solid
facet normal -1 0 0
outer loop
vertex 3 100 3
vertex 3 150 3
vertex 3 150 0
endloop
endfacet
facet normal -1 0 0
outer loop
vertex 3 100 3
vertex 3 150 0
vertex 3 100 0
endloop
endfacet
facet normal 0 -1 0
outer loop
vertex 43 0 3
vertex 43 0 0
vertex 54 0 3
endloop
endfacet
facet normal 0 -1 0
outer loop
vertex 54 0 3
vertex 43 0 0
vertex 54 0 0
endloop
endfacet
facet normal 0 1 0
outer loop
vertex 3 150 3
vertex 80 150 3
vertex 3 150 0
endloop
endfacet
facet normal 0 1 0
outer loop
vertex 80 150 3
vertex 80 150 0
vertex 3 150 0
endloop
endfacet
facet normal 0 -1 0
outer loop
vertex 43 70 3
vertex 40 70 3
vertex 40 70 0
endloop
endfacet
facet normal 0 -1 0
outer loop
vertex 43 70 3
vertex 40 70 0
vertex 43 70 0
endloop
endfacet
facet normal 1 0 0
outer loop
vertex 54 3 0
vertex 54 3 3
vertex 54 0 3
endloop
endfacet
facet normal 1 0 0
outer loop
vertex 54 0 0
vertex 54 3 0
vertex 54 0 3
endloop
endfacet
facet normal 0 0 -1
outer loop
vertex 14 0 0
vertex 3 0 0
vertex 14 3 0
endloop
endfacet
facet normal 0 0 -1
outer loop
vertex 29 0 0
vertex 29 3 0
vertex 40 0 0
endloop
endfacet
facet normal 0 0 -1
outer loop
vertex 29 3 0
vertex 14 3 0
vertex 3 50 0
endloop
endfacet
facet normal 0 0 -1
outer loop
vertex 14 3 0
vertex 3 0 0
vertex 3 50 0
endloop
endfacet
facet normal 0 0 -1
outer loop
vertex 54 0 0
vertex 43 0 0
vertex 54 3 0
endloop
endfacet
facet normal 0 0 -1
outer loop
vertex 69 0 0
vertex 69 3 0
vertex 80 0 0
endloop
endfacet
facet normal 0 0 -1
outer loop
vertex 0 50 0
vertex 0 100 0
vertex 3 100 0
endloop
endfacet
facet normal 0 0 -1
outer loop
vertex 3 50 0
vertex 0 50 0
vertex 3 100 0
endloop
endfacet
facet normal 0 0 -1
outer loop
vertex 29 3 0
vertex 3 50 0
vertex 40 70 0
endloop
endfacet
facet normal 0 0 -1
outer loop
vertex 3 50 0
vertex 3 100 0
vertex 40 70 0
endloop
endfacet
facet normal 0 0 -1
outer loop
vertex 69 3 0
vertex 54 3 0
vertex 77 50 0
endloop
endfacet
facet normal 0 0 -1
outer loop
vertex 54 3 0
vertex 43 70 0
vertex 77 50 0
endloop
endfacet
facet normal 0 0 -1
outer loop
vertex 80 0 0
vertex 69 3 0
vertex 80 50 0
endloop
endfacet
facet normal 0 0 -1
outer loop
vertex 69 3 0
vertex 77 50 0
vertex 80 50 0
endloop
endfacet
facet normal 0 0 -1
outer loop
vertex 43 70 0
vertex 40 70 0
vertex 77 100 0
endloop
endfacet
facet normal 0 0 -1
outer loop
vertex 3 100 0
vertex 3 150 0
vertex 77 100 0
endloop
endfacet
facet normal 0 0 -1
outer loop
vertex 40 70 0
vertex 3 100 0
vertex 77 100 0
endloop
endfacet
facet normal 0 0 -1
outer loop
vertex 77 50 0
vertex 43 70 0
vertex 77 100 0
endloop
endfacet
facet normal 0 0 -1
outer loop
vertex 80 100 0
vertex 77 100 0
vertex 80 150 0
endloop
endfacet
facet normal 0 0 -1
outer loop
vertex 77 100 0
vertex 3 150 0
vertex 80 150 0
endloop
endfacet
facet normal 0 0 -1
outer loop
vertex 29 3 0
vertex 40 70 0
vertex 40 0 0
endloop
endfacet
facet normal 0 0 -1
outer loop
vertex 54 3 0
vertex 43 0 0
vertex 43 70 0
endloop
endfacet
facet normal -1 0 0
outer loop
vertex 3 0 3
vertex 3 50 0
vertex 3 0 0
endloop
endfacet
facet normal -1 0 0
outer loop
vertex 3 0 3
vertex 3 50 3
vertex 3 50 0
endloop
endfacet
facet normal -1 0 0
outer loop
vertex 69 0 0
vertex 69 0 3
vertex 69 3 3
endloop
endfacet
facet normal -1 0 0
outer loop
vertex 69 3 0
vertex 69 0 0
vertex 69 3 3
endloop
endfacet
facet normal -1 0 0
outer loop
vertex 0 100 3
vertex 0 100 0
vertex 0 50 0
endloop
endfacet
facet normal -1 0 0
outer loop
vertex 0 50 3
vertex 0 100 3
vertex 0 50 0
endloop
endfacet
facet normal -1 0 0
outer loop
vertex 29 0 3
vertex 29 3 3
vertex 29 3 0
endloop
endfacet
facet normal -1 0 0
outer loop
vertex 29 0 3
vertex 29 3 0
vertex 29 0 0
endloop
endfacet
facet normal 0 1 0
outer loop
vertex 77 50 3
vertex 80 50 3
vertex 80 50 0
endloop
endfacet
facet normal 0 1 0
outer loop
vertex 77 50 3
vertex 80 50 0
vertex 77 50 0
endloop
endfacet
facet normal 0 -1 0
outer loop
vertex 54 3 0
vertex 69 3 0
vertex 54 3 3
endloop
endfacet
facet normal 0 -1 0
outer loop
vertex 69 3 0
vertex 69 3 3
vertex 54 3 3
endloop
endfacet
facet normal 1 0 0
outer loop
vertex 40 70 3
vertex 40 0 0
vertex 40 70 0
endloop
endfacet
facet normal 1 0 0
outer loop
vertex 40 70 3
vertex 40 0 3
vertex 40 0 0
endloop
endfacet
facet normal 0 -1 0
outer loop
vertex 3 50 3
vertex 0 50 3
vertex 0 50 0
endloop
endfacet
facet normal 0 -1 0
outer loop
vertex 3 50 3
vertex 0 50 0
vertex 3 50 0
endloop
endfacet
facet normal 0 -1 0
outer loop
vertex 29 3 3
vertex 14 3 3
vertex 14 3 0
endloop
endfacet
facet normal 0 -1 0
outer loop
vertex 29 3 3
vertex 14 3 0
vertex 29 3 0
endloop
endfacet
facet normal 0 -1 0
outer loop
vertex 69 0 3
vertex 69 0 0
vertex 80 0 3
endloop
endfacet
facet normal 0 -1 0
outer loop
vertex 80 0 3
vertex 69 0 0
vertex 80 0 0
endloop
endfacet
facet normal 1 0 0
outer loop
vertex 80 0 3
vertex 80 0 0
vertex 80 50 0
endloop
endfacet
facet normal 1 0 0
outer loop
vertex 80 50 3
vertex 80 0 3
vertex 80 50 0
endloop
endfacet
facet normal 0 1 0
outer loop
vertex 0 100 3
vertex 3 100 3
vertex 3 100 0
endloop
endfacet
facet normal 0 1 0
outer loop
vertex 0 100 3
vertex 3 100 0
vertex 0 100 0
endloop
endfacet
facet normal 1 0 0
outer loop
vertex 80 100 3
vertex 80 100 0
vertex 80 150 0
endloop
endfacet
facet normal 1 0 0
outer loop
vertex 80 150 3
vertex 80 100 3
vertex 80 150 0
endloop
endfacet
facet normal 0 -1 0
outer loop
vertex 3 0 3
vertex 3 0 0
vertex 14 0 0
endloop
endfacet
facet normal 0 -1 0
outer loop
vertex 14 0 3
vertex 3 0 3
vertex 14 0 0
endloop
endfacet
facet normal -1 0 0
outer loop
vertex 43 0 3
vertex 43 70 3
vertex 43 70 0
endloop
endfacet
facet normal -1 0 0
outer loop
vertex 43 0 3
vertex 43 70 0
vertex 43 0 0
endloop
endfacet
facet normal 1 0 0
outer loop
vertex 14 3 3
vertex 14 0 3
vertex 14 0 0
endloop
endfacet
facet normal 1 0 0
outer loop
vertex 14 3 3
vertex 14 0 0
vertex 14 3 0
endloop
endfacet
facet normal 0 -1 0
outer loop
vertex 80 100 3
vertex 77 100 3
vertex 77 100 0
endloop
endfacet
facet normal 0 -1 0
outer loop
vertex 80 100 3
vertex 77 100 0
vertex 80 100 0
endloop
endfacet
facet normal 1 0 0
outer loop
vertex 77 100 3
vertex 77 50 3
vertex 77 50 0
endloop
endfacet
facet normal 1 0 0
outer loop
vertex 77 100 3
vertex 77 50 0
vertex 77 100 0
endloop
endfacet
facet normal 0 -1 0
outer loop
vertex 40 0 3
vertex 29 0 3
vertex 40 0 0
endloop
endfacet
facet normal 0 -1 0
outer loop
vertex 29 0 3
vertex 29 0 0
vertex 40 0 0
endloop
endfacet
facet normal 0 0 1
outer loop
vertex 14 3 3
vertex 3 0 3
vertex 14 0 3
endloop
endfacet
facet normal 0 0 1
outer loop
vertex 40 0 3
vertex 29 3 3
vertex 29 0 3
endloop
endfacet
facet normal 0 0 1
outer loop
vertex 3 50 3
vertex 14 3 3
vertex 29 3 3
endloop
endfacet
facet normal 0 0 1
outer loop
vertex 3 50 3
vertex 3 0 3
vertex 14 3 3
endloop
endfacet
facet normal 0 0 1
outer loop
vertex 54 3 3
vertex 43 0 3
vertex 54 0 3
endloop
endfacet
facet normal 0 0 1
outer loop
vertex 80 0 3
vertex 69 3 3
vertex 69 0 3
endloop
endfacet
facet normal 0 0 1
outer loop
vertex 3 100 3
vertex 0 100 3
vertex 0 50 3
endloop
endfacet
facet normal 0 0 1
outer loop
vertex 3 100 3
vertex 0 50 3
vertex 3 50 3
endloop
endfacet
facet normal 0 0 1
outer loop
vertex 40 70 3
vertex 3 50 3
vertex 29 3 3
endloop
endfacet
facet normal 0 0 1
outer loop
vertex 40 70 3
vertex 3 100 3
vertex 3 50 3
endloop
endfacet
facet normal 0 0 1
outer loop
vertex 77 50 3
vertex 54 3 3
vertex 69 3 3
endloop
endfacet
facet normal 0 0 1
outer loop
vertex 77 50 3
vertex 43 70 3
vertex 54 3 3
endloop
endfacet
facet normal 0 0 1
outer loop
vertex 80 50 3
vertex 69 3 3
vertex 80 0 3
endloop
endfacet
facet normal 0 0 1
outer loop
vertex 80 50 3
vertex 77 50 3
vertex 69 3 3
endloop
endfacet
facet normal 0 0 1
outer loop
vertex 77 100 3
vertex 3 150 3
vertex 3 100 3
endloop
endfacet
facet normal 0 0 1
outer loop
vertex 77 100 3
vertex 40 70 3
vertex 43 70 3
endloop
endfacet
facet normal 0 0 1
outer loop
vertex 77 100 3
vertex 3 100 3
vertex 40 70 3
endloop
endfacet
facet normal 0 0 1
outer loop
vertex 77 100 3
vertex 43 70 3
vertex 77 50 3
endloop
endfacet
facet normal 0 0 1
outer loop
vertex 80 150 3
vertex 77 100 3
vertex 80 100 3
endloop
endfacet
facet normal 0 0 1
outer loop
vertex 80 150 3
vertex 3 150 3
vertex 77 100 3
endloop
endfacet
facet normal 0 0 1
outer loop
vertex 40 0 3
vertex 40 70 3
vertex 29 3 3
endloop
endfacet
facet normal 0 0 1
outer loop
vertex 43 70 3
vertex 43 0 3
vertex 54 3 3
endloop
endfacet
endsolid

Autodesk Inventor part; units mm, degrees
ref_plane "YZ Plane" through (0, 0, 0) normal (1, 0, 0) x (0, 1, 0)
ref_plane "XZ Plane" through (0, 0, 0) normal (0, 1, 0) x (-1, 0, 0)
ref_plane "XY Plane" through (0, 0, 0) normal (0, 0, 1) x (1, 0, 0)
sketch "Boceto1" plane through (0, 0, 0) normal (0, 0, 1) x (1, 0, 0)
  line L0 (0, 0) -> (80, 0)
  line L1 (80, 0) -> (80, 150)
  line L2 (80, 150) -> (0, 150)
  line L3 (0, 150) -> (0, 0)
  dimension "d0" = 80
  dimension "d1" = 150
extrude "Extrusión1" add sketch "Boceto1" along normal blind 3
sketch "Boceto2" plane through (0, 0, 3) normal (0, 0, 1) x (1, 0, 0)
  line L0 (0, 0) -> (80, 0) construction
  line L1 (80, 0) -> (80, 150) construction
  line L2 (80, 150) -> (0, 150) construction
  line L3 (0, 150) -> (0, 0) construction
  line L4 (3, 0) -> (0, 0)
  line L5 (0, 0) -> (0, 50)
  line L6 (0, 50) -> (3, 50)
  line L7 (3, 50) -> (3, 0)
  line L8 (0, 150) -> (3, 150)
  line L9 (3, 150) -> (3, 100)
  line L10 (3, 100) -> (0, 100)
  line L11 (0, 100) -> (0, 150)
  line L12 (77, 100) -> (80, 100)
  line L13 (80, 100) -> (80, 50)
  line L14 (80, 50) -> (77, 50)
  line L15 (77, 50) -> (77, 100)
  line L16 (80, 0) -> (80, 150) construction
  point P0 (80, 75)
  point P1 (80, 75)
  dimension "d4" = 3
  dimension "d5" = 50
  dimension "d6" = 3
  dimension "d7" = 50
  dimension "d8" = 50
  dimension "d9" = 3
extrude "Extrusión2" cut sketch "Boceto2" against normal blind 3
sketch "Boceto3" plane through (0, 0, 3) normal (0, 0, 1) x (1, 0, 0)
  line L0 (3, 50) -> (3, 0) construction
  line L1 (3, 0) -> (80, 0) construction
  line L2 (80, 0) -> (80, 50) construction
  line L3 (80, 50) -> (77, 50) construction
  line L4 (77, 50) -> (77, 100) construction
  line L5 (77, 100) -> (80, 100) construction
  line L6 (80, 100) -> (80, 150) construction
  line L7 (80, 150) -> (3, 150) construction
  line L8 (3, 150) -> (3, 100) construction
  line L9 (3, 100) -> (0, 100) construction
  line L10 (0, 100) -> (0, 50) construction
  line L11 (0, 50) -> (3, 50) construction
  line L12 (40, 70) -> (43, 70)
  line L13 (43, 70) -> (43, 0)
  line L14 (43, 0) -> (40, 0)
  line L15 (40, 0) -> (40, 70)
  line L16 (3, 0) -> (80, 0) construction
  point P0 (0, 0)
  point P1 (41.5, 0)
  point P2 (41.5, 0)
  dimension "d12" = 3
  dimension "d13" = 70
extrude "Extrusión3" cut sketch "Boceto3" against normal blind 10
sketch "Boceto4" plane through (0, 0, 3) normal (0, 0, 1) x (1, 0, 0)
  line L0 (43, 70) -> (43, 0) construction
  line L1 (43, 0) -> (80, 0) construction
  line L2 (80, 0) -> (80, 50) construction
  line L3 (80, 50) -> (77, 50) construction
  line L4 (77, 50) -> (77, 100) construction
  line L5 (77, 100) -> (80, 100) construction
  line L6 (80, 100) -> (80, 150) construction
  line L7 (80, 150) -> (3, 150) construction
  line L8 (3, 150) -> (3, 100) construction
  line L9 (3, 100) -> (0, 100) construction
  line L10 (0, 100) -> (0, 50) construction
  line L11 (0, 50) -> (3, 50) construction
  line L12 (3, 50) -> (3, 0) construction
  line L13 (3, 0) -> (40, 0) construction
  line L14 (40, 0) -> (40, 70) construction
  line L15 (40, 70) -> (43, 70) construction
  line L16 (14, 3) -> (29, 3)
  line L17 (29, 3) -> (29, 0)
  line L18 (29, 0) -> (14, 0)
  line L19 (14, 0) -> (14, 3)
  line L20 (69, 3) -> (54, 3)
  line L21 (54, 3) -> (54, 0)
  line L22 (54, 0) -> (69, 0)
  line L23 (69, 0) -> (69, 3)
  line L24 (3, 0) -> (40, 0) construction
  point P0 (0, 0)
  point P1 (61.5, 0)
  point P2 (61.5, 0)
  point P3 (21.5, 0)
  point P4 (21.5, 0)
  dimension "d16" = 3
  dimension "d17" = 3
  dimension "d18" = 15
  dimension "d19" = 15
extrude "Extrusión4" cut sketch "Boceto4" against normal blind 10
equation "\"d6\" = d4"
equation "\"d7\" = d5"
equation "\"d8\" = d7"
equation "\"d9\" = d4"
equation "\"d19\" = d18"
properties part number "Pared Garita2"
